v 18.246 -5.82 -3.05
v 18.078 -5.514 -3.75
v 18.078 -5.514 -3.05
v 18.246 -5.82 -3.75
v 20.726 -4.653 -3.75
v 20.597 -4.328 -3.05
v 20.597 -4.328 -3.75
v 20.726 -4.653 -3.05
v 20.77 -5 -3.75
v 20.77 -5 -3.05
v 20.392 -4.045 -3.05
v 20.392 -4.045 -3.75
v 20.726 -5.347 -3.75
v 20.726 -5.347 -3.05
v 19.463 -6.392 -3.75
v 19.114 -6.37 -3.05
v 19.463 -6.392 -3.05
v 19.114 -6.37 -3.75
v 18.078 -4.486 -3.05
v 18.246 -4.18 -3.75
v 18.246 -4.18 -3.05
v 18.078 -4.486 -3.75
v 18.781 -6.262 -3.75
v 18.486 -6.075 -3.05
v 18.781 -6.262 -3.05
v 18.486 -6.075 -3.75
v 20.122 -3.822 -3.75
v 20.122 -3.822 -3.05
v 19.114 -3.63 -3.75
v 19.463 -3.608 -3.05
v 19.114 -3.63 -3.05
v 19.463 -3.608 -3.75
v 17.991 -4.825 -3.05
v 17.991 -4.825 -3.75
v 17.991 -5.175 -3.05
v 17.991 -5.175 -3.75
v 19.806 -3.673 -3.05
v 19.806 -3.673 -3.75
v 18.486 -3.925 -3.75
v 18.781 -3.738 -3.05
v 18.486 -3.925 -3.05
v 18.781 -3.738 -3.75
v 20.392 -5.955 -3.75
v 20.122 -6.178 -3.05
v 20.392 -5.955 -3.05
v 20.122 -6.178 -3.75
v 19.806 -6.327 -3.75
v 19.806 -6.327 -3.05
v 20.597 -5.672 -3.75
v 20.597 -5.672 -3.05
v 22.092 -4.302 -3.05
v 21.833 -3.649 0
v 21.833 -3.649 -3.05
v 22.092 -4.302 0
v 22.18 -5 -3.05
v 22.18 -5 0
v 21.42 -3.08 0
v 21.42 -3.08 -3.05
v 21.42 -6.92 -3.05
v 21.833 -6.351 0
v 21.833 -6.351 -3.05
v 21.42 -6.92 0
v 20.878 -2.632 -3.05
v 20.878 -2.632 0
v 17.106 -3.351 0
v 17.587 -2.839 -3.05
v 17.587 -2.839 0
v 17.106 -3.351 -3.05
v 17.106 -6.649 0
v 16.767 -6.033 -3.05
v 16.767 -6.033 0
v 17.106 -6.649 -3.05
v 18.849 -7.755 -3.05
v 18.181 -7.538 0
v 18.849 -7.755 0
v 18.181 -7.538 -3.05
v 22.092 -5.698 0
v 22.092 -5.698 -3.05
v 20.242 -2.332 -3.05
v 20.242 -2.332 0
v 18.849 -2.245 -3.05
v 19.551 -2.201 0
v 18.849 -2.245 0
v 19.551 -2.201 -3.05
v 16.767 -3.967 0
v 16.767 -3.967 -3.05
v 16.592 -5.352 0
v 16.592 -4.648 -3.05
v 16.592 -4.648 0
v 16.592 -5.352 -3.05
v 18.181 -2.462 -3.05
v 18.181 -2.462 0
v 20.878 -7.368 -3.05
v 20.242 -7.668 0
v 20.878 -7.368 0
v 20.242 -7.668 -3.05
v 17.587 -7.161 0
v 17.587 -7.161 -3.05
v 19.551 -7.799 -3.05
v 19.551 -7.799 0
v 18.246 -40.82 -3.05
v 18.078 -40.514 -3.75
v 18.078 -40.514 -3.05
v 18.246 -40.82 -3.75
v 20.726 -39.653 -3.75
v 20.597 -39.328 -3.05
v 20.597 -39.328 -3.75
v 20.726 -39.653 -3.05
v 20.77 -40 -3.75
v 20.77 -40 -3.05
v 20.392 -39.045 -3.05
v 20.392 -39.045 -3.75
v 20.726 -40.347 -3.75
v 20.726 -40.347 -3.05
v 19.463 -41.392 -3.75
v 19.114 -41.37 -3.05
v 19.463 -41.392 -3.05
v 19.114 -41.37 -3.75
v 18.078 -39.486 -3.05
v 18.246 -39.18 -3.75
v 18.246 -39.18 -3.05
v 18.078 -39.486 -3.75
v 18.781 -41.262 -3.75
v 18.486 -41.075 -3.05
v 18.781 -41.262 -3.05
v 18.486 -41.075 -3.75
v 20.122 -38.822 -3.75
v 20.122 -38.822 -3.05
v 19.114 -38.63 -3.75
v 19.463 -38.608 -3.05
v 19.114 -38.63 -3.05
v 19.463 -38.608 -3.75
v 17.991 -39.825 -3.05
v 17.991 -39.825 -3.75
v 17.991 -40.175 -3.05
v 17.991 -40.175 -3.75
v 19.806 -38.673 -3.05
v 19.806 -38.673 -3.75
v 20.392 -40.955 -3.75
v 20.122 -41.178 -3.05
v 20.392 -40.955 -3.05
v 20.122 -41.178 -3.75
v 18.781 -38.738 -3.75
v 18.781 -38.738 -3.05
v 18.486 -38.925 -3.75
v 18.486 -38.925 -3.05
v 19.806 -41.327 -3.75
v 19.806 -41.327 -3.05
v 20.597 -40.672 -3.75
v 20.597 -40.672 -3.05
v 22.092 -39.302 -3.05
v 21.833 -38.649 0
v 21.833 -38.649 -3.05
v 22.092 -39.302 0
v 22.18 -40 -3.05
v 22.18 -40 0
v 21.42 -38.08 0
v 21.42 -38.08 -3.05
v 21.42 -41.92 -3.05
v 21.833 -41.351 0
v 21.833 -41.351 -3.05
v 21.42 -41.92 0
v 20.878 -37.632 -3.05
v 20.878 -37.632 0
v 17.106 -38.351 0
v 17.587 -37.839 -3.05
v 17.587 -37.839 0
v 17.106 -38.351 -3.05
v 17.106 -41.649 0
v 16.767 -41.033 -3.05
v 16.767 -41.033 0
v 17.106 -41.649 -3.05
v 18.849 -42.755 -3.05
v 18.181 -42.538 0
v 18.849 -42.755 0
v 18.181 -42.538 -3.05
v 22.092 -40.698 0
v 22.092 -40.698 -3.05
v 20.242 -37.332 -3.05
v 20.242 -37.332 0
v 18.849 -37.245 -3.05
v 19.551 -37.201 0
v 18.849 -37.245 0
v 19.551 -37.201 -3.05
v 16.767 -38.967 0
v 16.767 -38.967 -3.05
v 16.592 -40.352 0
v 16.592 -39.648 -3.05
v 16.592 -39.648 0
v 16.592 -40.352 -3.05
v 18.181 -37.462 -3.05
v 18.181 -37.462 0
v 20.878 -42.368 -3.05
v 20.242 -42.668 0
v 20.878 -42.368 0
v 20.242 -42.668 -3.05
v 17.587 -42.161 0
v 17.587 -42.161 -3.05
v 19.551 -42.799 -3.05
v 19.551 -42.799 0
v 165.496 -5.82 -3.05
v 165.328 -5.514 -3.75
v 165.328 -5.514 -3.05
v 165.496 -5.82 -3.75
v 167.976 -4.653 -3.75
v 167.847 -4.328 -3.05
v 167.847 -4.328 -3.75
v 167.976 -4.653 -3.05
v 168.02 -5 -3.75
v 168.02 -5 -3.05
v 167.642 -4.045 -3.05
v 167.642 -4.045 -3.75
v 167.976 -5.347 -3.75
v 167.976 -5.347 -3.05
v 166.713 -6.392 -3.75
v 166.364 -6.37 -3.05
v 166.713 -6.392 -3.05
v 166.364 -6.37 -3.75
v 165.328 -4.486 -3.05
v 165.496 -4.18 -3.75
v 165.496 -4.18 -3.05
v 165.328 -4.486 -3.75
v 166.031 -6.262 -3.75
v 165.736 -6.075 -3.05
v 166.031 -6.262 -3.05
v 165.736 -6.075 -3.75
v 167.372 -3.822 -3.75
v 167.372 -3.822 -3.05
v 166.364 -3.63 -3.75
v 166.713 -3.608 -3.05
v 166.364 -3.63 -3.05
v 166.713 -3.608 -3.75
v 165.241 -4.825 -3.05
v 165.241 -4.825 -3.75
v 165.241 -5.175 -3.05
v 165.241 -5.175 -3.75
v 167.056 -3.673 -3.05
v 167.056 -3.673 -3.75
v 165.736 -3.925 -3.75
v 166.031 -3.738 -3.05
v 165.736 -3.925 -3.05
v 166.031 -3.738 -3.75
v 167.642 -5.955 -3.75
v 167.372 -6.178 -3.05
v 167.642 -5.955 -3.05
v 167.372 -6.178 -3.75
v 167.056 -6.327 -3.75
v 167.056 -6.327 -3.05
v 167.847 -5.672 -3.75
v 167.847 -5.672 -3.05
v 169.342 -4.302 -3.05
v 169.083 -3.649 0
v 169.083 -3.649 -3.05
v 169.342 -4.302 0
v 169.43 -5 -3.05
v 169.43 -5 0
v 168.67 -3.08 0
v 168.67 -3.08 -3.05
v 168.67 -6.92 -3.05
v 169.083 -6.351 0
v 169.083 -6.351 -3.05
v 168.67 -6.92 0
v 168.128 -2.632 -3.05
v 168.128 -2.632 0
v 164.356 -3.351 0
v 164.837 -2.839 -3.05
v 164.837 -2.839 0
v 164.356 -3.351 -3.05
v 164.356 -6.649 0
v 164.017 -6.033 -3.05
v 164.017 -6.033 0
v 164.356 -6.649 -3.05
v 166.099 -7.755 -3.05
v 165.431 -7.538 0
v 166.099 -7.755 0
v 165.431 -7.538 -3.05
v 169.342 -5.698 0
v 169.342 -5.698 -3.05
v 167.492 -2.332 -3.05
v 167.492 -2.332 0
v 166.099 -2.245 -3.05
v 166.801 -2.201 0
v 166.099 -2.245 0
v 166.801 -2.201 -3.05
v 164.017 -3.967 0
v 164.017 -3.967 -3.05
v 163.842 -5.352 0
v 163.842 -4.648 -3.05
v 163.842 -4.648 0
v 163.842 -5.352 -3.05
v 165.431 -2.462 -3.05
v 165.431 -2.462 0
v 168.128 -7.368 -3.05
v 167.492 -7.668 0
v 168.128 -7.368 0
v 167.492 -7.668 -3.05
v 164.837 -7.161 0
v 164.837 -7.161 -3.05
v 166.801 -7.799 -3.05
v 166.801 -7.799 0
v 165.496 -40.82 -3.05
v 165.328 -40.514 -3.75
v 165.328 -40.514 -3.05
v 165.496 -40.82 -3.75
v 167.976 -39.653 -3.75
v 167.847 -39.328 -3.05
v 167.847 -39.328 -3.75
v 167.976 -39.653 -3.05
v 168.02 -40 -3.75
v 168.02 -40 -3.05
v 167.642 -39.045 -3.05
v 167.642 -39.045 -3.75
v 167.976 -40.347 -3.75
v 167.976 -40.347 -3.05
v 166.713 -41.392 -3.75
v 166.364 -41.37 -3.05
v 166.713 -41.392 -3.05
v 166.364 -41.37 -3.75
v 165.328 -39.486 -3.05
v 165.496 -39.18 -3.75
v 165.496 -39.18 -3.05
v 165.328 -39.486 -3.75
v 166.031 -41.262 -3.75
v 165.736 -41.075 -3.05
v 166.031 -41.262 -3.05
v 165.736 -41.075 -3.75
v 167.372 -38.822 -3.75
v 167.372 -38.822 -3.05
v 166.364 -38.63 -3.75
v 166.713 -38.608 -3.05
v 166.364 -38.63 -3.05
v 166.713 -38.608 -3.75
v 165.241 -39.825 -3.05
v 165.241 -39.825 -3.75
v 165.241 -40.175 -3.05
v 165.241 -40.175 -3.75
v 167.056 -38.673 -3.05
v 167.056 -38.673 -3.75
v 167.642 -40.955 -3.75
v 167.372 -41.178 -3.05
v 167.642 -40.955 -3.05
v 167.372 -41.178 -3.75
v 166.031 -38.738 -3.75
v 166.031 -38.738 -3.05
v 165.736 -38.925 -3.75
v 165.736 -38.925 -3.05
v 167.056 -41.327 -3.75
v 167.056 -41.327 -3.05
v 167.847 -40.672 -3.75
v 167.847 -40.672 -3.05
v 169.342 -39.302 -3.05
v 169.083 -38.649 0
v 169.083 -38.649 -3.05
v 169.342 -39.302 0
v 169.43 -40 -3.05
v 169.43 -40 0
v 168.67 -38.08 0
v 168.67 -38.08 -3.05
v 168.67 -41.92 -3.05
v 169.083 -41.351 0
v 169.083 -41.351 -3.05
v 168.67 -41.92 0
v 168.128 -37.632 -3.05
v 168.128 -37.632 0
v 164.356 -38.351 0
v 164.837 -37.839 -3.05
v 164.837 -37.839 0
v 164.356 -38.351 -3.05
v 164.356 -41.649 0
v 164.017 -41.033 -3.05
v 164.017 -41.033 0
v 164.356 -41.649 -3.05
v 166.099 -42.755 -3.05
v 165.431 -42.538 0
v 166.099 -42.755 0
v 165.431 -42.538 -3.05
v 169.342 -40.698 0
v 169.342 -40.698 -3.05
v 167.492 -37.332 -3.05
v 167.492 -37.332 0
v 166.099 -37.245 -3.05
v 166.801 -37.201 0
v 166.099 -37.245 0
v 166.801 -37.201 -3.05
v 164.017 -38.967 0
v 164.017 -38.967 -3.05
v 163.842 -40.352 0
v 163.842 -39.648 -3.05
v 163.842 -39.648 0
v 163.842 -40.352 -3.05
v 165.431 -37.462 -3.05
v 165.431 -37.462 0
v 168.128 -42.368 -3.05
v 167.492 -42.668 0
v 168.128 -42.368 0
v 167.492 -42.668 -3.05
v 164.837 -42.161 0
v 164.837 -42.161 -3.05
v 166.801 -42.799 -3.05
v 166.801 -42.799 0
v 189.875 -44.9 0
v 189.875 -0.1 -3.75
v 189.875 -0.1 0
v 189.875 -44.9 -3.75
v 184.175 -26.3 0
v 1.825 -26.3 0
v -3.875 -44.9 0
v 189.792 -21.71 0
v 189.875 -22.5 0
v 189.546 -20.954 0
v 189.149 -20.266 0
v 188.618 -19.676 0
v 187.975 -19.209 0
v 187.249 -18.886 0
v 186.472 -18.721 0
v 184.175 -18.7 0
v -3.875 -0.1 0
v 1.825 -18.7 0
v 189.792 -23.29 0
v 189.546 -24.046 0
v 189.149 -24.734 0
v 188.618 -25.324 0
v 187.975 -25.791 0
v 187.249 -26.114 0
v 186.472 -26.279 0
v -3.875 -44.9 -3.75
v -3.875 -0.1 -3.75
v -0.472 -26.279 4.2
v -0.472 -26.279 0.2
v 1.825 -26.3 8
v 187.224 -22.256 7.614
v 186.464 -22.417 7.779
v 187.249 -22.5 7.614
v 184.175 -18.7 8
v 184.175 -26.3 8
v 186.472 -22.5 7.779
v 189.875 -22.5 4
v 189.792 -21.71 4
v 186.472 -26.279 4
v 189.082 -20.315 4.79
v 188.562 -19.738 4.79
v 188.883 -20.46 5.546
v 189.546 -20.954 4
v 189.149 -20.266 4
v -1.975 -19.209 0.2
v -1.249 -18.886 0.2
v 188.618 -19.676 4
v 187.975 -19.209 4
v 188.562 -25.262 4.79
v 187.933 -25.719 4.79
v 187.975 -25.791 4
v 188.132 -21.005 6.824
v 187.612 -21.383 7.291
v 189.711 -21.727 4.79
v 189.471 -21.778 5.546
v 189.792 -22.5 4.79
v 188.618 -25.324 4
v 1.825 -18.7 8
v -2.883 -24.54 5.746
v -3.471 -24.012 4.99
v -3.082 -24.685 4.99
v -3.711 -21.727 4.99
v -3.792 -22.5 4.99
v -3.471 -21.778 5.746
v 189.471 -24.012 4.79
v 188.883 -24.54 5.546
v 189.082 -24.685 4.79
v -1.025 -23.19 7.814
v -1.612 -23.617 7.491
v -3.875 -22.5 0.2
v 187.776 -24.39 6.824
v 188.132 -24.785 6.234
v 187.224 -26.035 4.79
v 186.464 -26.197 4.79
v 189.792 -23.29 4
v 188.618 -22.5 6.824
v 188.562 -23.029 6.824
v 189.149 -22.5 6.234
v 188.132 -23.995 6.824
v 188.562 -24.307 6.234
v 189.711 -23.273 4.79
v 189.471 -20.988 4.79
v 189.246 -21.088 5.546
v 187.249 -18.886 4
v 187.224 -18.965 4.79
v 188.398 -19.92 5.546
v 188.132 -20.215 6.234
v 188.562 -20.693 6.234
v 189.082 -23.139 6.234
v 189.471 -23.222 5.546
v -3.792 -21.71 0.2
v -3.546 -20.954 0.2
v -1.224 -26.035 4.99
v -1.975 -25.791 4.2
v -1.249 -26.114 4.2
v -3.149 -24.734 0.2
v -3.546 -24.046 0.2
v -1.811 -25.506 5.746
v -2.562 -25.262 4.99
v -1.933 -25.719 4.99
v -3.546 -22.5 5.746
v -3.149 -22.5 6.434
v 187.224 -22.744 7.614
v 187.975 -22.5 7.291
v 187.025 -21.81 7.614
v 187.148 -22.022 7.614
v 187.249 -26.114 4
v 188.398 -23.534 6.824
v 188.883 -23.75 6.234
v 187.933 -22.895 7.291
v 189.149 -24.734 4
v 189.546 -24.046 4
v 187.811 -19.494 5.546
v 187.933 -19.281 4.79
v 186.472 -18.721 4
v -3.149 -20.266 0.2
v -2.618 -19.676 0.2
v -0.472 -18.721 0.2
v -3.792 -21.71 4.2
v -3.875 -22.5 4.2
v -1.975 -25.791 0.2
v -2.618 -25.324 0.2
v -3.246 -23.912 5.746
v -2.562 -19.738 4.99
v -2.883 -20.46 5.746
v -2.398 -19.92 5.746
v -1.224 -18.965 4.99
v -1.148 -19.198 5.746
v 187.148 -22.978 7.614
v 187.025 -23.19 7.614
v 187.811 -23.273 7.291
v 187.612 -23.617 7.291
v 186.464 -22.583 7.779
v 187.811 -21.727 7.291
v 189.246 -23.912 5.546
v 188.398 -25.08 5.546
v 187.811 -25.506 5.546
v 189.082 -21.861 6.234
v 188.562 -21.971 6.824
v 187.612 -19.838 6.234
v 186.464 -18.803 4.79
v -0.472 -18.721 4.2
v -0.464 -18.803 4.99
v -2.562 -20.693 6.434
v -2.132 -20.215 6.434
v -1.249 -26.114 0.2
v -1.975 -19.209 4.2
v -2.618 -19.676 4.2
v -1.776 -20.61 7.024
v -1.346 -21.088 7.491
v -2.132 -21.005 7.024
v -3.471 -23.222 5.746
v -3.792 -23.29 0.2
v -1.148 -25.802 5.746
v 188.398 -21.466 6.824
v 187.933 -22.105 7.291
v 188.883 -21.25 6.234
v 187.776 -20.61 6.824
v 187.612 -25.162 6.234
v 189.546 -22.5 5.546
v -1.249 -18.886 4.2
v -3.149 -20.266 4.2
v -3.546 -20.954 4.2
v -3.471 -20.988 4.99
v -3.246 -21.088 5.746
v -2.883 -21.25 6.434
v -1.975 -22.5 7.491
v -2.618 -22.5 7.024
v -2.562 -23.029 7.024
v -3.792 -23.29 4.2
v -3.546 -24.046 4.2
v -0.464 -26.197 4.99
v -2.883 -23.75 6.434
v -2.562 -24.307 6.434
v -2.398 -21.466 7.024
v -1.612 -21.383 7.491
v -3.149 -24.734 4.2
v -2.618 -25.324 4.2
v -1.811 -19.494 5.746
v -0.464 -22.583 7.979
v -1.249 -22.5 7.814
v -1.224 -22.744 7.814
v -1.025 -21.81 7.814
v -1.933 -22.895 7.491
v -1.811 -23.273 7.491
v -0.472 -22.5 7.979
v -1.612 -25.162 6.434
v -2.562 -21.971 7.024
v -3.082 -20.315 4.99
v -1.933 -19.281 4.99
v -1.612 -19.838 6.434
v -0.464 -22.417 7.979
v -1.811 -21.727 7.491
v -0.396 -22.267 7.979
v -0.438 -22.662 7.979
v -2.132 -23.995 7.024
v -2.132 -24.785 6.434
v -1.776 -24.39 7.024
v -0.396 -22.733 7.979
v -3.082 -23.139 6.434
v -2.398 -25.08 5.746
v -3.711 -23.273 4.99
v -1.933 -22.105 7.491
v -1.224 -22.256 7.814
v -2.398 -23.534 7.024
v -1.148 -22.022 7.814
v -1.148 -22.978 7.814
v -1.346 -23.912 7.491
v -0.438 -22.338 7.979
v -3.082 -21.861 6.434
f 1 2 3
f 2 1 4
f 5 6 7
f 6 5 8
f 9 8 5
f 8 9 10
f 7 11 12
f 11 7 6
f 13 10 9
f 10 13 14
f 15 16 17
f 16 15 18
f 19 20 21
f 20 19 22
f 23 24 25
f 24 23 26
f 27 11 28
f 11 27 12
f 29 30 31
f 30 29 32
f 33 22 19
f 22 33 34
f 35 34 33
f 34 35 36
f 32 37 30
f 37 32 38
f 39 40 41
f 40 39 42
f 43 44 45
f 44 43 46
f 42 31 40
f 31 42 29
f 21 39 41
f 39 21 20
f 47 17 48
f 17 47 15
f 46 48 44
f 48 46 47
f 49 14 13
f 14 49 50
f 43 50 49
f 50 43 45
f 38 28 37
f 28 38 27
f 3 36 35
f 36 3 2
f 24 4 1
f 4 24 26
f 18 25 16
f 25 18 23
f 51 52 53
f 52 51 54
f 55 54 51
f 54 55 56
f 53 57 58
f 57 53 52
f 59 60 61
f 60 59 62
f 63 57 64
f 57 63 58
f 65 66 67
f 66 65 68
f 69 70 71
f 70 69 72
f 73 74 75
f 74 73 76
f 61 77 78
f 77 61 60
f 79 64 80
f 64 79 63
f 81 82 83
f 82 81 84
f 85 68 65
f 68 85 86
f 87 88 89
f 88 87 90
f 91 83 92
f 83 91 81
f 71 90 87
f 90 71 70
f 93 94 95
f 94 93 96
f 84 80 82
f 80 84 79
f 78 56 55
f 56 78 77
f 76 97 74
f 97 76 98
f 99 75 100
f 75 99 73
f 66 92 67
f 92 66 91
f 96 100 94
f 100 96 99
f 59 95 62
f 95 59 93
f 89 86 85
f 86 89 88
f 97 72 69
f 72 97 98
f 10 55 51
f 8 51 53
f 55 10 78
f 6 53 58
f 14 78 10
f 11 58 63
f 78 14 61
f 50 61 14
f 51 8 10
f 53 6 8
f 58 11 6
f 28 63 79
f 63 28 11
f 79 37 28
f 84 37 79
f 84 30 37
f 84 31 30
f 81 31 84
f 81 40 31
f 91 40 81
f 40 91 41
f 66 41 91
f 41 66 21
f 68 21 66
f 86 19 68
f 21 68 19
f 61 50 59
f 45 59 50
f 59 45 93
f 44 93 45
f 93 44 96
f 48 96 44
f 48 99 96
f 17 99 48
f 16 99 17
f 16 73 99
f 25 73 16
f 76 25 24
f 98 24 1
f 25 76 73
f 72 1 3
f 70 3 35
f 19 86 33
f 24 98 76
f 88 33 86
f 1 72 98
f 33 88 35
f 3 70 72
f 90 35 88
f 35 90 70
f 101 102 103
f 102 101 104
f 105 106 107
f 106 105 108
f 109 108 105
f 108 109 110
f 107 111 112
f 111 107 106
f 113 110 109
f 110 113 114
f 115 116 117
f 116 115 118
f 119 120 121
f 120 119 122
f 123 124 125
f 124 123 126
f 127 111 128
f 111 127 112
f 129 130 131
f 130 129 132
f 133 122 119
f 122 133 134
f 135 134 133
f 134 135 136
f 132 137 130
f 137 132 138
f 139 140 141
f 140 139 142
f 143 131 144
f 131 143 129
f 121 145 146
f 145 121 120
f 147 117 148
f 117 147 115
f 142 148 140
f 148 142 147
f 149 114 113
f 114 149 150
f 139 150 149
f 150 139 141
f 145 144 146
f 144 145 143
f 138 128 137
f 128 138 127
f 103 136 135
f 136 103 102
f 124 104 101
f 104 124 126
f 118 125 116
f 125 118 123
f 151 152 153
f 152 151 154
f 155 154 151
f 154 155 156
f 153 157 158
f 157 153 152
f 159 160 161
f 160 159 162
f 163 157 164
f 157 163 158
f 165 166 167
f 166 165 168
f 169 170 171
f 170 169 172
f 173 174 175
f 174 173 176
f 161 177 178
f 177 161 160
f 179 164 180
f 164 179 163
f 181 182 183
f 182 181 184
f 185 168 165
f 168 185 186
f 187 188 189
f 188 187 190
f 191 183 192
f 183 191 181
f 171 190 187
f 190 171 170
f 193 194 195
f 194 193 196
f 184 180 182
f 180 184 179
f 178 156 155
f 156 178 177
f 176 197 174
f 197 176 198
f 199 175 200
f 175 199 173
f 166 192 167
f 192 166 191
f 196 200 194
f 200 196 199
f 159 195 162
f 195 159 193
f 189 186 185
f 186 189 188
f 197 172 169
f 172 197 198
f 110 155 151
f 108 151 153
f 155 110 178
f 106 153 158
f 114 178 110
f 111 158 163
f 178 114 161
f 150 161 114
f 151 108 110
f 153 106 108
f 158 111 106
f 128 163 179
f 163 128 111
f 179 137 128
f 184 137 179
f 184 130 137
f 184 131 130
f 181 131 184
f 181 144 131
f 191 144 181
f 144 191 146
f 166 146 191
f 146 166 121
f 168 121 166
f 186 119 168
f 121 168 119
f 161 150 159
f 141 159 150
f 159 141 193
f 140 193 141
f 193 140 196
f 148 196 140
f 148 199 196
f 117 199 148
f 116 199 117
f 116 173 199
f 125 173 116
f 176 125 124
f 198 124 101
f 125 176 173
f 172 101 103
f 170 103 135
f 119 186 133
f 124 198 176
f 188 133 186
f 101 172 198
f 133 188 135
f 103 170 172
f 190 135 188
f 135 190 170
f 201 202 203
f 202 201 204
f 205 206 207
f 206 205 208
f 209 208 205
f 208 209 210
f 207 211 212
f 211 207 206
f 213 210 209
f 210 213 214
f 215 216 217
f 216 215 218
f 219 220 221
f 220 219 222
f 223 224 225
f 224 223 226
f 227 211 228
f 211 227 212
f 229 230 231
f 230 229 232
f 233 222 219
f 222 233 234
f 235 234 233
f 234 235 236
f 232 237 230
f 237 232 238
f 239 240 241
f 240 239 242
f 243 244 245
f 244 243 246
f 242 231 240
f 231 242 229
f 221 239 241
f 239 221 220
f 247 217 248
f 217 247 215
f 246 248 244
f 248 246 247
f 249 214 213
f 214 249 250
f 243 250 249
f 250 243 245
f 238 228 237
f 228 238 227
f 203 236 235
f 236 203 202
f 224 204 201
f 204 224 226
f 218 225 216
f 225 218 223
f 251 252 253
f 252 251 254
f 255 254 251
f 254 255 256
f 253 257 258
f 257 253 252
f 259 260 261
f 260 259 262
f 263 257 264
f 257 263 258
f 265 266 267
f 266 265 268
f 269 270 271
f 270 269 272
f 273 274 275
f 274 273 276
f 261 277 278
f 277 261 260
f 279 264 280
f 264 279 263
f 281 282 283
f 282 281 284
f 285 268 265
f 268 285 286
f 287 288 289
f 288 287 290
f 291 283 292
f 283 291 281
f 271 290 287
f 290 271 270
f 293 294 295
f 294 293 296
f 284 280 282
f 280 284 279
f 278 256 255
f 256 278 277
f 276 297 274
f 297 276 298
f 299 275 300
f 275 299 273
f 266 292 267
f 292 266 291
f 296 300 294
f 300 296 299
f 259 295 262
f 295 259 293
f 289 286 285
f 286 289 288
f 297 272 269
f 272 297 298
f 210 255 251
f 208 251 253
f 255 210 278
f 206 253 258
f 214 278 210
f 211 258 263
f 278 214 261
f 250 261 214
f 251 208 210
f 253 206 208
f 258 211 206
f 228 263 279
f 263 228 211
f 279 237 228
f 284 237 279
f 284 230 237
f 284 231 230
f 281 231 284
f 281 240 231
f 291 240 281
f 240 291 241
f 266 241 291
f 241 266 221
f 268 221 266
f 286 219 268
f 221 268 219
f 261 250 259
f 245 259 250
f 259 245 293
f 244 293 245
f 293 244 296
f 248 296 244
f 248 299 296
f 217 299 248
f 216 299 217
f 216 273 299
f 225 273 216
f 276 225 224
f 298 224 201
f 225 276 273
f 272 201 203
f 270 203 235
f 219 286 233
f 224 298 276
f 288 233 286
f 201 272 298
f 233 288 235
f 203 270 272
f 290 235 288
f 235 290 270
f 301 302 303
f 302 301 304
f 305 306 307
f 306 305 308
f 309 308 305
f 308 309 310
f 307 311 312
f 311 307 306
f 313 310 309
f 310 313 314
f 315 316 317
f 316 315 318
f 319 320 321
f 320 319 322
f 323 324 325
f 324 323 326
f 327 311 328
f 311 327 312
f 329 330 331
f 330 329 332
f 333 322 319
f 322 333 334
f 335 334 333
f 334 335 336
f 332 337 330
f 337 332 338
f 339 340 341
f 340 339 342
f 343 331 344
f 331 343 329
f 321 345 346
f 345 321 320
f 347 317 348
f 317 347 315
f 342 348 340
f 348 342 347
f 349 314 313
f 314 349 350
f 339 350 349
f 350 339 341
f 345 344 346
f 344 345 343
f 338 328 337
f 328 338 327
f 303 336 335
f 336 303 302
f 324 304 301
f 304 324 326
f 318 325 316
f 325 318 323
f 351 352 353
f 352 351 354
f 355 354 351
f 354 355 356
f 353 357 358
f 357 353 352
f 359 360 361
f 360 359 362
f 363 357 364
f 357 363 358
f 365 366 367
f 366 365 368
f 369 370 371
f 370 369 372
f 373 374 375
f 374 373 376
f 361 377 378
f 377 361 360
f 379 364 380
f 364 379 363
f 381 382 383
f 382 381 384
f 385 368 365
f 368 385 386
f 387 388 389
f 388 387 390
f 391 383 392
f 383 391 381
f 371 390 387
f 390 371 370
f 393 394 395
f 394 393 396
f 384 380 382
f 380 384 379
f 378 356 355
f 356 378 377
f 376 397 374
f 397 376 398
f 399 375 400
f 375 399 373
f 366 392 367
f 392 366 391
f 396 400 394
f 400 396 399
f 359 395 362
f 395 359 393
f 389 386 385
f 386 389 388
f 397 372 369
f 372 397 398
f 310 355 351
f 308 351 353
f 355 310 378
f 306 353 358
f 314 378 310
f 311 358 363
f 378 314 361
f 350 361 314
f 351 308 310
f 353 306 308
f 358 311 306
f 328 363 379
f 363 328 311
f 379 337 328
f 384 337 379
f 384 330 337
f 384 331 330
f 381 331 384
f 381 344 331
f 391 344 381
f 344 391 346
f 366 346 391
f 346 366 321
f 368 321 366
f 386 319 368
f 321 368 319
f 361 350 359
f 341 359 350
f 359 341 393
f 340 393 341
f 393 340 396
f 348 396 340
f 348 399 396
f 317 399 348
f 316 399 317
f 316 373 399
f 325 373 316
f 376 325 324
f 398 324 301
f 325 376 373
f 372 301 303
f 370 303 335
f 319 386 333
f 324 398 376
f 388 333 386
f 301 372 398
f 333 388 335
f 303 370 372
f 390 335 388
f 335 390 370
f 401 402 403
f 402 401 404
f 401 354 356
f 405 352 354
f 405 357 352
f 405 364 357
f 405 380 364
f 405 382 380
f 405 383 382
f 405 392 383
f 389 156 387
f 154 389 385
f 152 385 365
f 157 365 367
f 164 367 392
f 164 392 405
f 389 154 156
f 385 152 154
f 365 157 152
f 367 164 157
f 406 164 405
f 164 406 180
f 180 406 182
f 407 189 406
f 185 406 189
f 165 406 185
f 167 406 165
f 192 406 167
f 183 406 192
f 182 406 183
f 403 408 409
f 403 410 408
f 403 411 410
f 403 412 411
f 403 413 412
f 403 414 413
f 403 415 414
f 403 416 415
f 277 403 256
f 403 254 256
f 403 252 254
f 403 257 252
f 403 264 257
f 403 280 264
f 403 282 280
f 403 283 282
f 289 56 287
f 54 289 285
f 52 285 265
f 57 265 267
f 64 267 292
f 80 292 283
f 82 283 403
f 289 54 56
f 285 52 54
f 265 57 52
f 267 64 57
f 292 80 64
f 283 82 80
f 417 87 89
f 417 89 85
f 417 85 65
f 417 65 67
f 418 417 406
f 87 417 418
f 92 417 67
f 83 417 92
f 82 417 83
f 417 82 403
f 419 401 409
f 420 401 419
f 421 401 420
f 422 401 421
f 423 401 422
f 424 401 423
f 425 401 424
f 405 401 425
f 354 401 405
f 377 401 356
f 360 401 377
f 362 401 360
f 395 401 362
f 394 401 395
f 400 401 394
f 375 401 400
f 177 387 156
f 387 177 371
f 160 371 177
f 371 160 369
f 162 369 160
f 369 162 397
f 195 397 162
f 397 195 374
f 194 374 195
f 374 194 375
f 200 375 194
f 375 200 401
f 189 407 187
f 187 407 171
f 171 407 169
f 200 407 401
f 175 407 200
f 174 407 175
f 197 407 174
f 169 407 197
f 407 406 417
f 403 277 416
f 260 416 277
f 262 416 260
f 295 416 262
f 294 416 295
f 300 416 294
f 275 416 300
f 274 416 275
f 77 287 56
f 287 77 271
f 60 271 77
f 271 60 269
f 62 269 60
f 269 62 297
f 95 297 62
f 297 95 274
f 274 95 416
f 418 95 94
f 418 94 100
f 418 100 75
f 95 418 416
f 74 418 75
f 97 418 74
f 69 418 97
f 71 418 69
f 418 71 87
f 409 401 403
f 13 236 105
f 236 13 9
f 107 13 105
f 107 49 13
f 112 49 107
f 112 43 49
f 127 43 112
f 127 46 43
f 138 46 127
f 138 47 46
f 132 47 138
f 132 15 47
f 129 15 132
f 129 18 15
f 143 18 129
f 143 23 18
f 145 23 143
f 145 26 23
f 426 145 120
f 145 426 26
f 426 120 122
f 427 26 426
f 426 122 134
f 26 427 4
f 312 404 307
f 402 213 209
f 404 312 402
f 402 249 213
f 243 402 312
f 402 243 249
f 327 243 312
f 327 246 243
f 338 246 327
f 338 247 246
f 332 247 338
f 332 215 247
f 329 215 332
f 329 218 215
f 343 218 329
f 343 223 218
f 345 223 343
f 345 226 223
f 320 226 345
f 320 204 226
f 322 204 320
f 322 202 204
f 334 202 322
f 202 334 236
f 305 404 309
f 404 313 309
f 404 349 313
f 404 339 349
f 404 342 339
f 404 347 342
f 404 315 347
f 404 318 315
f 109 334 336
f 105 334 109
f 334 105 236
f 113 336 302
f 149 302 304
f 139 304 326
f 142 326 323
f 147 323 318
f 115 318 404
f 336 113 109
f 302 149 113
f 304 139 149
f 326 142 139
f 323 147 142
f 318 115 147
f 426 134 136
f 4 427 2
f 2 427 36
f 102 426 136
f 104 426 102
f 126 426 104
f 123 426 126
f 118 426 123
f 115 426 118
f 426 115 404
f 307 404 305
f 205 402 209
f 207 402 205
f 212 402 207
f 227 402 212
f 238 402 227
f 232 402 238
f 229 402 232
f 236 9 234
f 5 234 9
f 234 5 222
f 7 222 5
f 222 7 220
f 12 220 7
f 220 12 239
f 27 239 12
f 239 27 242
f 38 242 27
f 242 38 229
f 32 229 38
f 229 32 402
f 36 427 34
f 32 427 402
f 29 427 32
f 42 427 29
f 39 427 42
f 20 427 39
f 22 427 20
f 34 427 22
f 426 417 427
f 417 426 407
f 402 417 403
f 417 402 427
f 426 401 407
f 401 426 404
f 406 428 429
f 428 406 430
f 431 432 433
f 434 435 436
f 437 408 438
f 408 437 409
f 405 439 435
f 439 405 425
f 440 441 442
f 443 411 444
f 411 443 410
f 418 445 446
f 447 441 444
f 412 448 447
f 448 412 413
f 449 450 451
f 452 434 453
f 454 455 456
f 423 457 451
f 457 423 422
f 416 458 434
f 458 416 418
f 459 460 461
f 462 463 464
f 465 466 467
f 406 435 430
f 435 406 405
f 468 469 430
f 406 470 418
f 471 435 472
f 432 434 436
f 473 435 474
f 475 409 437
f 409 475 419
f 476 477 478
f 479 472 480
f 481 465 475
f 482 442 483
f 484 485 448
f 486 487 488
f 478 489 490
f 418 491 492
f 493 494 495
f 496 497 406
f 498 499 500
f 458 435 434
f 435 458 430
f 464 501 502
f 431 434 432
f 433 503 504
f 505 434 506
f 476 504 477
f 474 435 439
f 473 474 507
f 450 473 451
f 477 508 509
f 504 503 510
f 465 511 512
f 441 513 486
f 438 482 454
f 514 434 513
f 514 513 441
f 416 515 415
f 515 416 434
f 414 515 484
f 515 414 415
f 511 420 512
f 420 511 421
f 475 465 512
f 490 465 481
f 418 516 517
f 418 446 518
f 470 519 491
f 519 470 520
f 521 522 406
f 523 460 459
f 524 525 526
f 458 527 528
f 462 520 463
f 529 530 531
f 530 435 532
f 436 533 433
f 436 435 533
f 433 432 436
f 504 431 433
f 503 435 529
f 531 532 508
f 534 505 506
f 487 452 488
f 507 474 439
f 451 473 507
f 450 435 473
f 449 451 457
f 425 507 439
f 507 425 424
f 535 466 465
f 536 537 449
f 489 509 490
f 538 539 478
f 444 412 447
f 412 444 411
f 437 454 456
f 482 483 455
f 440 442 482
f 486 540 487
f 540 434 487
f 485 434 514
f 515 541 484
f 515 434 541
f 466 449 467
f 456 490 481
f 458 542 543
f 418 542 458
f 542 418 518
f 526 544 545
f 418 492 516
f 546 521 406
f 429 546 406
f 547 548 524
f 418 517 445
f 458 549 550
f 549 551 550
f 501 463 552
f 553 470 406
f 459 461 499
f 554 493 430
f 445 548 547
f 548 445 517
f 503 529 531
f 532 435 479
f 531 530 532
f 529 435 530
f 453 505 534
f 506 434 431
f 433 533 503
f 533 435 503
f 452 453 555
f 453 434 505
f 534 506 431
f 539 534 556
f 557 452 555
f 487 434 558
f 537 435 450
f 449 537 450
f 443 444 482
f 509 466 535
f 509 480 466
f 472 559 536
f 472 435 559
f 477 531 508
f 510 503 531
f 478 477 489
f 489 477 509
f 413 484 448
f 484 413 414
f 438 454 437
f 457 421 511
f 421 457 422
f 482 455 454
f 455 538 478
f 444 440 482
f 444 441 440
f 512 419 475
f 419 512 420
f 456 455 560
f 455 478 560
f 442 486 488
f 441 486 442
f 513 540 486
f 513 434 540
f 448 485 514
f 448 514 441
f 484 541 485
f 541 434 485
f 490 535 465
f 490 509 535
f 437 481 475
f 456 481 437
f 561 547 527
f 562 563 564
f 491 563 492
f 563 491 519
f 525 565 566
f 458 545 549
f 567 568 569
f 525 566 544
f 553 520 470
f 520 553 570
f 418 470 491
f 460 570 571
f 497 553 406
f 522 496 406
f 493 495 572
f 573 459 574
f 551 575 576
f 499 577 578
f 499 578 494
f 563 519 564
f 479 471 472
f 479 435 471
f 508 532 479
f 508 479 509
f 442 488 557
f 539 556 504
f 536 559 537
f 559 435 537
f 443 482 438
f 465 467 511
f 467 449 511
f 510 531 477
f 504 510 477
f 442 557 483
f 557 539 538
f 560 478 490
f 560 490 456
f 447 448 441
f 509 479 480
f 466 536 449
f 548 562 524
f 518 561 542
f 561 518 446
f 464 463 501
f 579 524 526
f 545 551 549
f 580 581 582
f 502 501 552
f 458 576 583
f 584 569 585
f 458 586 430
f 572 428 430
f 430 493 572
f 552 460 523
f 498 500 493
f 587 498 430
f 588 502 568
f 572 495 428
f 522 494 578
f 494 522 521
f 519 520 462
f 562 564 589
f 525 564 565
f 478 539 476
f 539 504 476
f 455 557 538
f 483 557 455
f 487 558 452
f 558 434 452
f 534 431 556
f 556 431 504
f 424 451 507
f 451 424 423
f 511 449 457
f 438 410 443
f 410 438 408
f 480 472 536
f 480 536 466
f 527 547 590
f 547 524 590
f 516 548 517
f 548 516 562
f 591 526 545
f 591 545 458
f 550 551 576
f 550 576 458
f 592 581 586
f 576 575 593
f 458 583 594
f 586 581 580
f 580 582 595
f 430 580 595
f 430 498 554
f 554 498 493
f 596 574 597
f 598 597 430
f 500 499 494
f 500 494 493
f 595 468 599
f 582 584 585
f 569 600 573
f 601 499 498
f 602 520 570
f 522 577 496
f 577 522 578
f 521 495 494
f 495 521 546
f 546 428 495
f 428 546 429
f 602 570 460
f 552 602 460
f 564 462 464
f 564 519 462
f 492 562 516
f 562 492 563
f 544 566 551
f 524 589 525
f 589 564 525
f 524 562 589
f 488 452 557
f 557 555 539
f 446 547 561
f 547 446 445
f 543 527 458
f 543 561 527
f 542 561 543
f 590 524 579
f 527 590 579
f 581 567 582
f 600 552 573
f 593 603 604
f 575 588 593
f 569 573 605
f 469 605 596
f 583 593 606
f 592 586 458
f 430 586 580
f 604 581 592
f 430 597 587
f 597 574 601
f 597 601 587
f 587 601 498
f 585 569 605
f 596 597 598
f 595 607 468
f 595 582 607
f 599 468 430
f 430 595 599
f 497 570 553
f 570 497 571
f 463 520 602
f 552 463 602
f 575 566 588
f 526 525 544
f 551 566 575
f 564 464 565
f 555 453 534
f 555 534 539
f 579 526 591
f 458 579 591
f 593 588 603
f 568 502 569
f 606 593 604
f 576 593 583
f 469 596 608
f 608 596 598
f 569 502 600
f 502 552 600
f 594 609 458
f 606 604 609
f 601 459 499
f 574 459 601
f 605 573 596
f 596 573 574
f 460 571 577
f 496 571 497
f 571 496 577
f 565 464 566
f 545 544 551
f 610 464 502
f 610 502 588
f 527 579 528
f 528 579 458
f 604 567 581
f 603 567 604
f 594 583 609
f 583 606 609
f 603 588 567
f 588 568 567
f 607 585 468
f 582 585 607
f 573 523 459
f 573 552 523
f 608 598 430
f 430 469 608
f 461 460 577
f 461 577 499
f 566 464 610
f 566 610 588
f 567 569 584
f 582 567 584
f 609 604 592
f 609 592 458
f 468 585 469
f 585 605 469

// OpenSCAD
// file: ../modules/roundedRail.scad
include<params.scad>;

module roundedRail(width,depth,height) {
    $fn = 30;
    rad = depth/2;
    translate([-width/2,0,0])
    hull() {
        translate([width/2,0,0])
        cube([width-rad*3,depth,height], center = true);
        translate([rad, 0, height/2 - rad]) {
            sphere(rad);
            translate([0,0,-height/2 + 0.5])
            cylinder(1,rad,rad, center = true);
        }
        translate([width - rad,0,0])
        {
            sphere(rad);
            translate([0,0,-height/2 + 0.5])
            cylinder(1,rad,rad, center = true);
        }
    }
}
// file: ../modules/needlebedScrews.scad
include<params.scad>;
//include<needlebed.scad>;

module screwHoles(screw) {
    
    
    // "screw" is passed in during the loop to place holes at either end of the assembly
    if (screw > 0) { //left half
       // spongebar screw
       translate([gauge/2,-(NEEDLE_BED_DEPTH-COMB) + SPONGE_BAR/2, 0]) {
         cylinder(h = needleBedHeight*2 + 1, d = screwDiamSm, center = true, $fn = 25); 
         translate([0,0,railHeight]) 
             cylinder(h = screwHeadHeight*2 + tolerance, d = screwHeadDiamSm, center = true, $fn = 25);   
       }
       // back screw, back cover
       translate([gauge/2, -5, 0]) {
         cylinder(h = needleBedHeight*2 + 1, d = screwDiamSm, center = true, $fn = 25);
                cylinder(h = screwHeadHeight*2 + tolerance, d = screwHeadDiamSm, center = true, $fn = 25);   
       }    
         // front screw, back cover
       translate([gauge/2, -BACK_COVER + 5, 0]) {
         cylinder(h = needleBedHeight*2 + 1, d = screwDiamSm, center = true, $fn = 25);  
          cylinder(h = screwHeadHeight*2 + tolerance, d = screwHeadDiamSm, center = true, $fn = 25);   
       }
     }
     
     if (screw < 0) { //right half
       // spongebar screw
       translate([-gauge/2,-(NEEDLE_BED_DEPTH-COMB) + SPONGE_BAR/2, 0]) {
         cylinder(h = needleBedHeight*2 + 1, d = screwDiamSm, center = true, $fn = 25); 
         translate([0,0,railHeight]) 
             cylinder(h = screwHeadHeight*2 + tolerance, d = screwHeadDiamSm, center = true, $fn = 25);   
       }
       // back screw, back cover
       translate([-gauge/2, -5, 0]) {
         cylinder(h = needleBedHeight*2 + 1, d = screwDiamSm, center = true, $fn = 25);
                cylinder(h = screwHeadHeight*2 + tolerance, d = screwHeadDiamSm, center = true, $fn = 25);   
       }    
         // front screw, back cover
       translate([-gauge/2, -BACK_COVER + 5, 0]) {
         cylinder(h = needleBedHeight*2 + 1, d = screwDiamSm, center = true, $fn = 25);  
          cylinder(h = screwHeadHeight*2 + tolerance, d = screwHeadDiamSm, center = true, $fn = 25);   
       }
     }
  
}

//screwHoles(screw = 1);
module needleBedScrews() {
    for(i = [0:numNeedles-1]) {
        if (i==screwPlacement || i==numNeedles-screwPlacement) {
              translate([gauge*i, 0, 0]) {
              screwHoles(screw = -1); 
              }
        } else if (i == screwPlacement - 1 || i==numNeedles-(screwPlacement + 1)) {
            //LS screw holes
                translate([gauge*i, 0, 0])
                screwHoles(screw = 1);  
        }
    }
}

needleBedScrews() {
}
// file: ../modules/params.scad
/*

Values in `camelCase` are user-variable (within reason); 
values like numNeedles and screwDiam, etc.,  can be modified to
accommodate user preference or hardware subsitution. 

Values in `ALL_CAPS` should be considered CONSTANTS and should
only be modified with *extreme caution* as they will affect the 
relationship between the needles and the cams, which could
prevent stitches from forming correctly.

I recommend only modifying these constants if you are also 
making changes to the cam design in the technical sketch.
*/

$fn = 50;

STANDARD_GAUGE = 4.5;
MID_GAUGE = 6.5;
BULKY_GAUGE = 9.0;
BRIAN_GAUGE = 7.75;

gauge = BRIAN_GAUGE;
// gauge = STANDARD_GAUGE; // I recommend using one of the predefined gauges above
numNeedles = 25;
tolerance = 0.2; // allows a bit of room for parts that have to fit together; adjust according to your printer's precision

// ---
// Hardware dimensions 
// (actual measurements, no tolerances)

// - pan head 6-32 machine screws
screwDiam = 3.45;
screwHeight = 18;
screwHeadDiam = 6.75 + tolerance * 2; 
screwHeadHeight = 2.55 + tolerance * 2;
nutWidth = 7.9;

// - pan head 4-40 machine screws (M3 should also work where these are used)
screwDiamSm = 2.79;
screwHeightSm = 14.62;
screwHeadHeightSm = 2.41 + tolerance * 2;
screwHeadDiamSm = 5.21 + tolerance * 2;
nutHeight = 2.8;

// ---
// Needle dimensions
// - Brother needles
BUTT_HEIGHT = 15;
NEEDLE_WIDTH = 1.25;
NEEDLE_LEG_HEIGHT = 1.85;
HOOK_DIAM = 3.5;

// ---
// Needle Bed Zones
BACK_COVER = 45;
OOW_TRACK = 8;
B_TRACK = 42; // will divvy up working tracks (B & C position) later
C_TRACK = 0;
WORKING_TRACK = B_TRACK + C_TRACK;
HOLD_TRACK = 8;
SPONGE_BAR = 12;
COMB = 29;
NEEDLE_EXTENSION = 34.5;

// ---
// Needle bed dimensions
NEEDLE_BED_DEPTH = BACK_COVER + OOW_TRACK + WORKING_TRACK + HOLD_TRACK + SPONGE_BAR + COMB;
needleBedHeight = screwHeight + 2;
needleSlotHeight = NEEDLE_LEG_HEIGHT * 2 + screwHeadHeight;
needleSlotWidth = NEEDLE_WIDTH + 0.25; // add a small amount of clearance
combWidth = gauge*2/3; // width of cutouts for stitch formation; this gives room for the thickness of the yarn looped around the needle when it pulls back into the slot, but has to balance leaving enough material for the remaining "teeth" to not be too fragile
spongeThickness = 2.5;
spongeBarThickness = needleSlotHeight - NEEDLE_LEG_HEIGHT - spongeThickness;
YARN_DEPOSIT_Y = -155.1;
YARN_DEPOSIT_Z = -needleSlotHeight + HOOK_DIAM;
connectorOffset = 20;

screwPlacement = 3; // how many needles from edge of bed; min 2, max floor(numNeedles/2)

// ---
// Carriage dimensions
// refer to technical sketch
camHeight = BUTT_HEIGHT; // thickness of the tracks the needles ride along
camPlateHeight = 4; // plate behind the cams
CAM_PLATE_WIDTH = 91 * 2; 
CAM_PLATE_DEPTH = NEEDLE_BED_DEPTH - COMB + 6;

railDepth = 8;
railHeight = 8; // ???
xOffset = 16.5;
//vCamScrews = [[34-xOffset, -90.25, 0],[58-xOffset, -74.25, 0],[86-xOffset,-90.25, 0]];

echo(needleSlotHeight);
// main file
include<../modules/params.scad>;
use<../modules/needlebedScrews.scad>;
use<../modules/roundedRail.scad>;

module backCover(width = gauge) { 

            translate([0,-BACK_COVER/2, -((screwHeadHeight + 1) - tolerance)/2])
            cube([width, BACK_COVER - tolerance, (screwHeadHeight + 1) - tolerance], center = true);
}

module backRail(width = gauge, rounded = false, tolerance = tolerance) {
    translate([0,-BACK_COVER/2, railHeight/2]) {
        if (rounded) {
            roundedRail(width, railDepth - tolerance*2, railHeight);
        } else {
            cube([width, railDepth - tolerance*2, railHeight], center = true);
        }
    }
}

difference() {
    translate([gauge*numNeedles/2 - gauge/2, 0, 0])
    
    backCover(width = numNeedles*gauge);
    needleBedScrews();
}


translate([(gauge*numNeedles)/2 - gauge/2, 0, 0]) 
backRail(width = numNeedles * gauge, rounded = true);        
     
